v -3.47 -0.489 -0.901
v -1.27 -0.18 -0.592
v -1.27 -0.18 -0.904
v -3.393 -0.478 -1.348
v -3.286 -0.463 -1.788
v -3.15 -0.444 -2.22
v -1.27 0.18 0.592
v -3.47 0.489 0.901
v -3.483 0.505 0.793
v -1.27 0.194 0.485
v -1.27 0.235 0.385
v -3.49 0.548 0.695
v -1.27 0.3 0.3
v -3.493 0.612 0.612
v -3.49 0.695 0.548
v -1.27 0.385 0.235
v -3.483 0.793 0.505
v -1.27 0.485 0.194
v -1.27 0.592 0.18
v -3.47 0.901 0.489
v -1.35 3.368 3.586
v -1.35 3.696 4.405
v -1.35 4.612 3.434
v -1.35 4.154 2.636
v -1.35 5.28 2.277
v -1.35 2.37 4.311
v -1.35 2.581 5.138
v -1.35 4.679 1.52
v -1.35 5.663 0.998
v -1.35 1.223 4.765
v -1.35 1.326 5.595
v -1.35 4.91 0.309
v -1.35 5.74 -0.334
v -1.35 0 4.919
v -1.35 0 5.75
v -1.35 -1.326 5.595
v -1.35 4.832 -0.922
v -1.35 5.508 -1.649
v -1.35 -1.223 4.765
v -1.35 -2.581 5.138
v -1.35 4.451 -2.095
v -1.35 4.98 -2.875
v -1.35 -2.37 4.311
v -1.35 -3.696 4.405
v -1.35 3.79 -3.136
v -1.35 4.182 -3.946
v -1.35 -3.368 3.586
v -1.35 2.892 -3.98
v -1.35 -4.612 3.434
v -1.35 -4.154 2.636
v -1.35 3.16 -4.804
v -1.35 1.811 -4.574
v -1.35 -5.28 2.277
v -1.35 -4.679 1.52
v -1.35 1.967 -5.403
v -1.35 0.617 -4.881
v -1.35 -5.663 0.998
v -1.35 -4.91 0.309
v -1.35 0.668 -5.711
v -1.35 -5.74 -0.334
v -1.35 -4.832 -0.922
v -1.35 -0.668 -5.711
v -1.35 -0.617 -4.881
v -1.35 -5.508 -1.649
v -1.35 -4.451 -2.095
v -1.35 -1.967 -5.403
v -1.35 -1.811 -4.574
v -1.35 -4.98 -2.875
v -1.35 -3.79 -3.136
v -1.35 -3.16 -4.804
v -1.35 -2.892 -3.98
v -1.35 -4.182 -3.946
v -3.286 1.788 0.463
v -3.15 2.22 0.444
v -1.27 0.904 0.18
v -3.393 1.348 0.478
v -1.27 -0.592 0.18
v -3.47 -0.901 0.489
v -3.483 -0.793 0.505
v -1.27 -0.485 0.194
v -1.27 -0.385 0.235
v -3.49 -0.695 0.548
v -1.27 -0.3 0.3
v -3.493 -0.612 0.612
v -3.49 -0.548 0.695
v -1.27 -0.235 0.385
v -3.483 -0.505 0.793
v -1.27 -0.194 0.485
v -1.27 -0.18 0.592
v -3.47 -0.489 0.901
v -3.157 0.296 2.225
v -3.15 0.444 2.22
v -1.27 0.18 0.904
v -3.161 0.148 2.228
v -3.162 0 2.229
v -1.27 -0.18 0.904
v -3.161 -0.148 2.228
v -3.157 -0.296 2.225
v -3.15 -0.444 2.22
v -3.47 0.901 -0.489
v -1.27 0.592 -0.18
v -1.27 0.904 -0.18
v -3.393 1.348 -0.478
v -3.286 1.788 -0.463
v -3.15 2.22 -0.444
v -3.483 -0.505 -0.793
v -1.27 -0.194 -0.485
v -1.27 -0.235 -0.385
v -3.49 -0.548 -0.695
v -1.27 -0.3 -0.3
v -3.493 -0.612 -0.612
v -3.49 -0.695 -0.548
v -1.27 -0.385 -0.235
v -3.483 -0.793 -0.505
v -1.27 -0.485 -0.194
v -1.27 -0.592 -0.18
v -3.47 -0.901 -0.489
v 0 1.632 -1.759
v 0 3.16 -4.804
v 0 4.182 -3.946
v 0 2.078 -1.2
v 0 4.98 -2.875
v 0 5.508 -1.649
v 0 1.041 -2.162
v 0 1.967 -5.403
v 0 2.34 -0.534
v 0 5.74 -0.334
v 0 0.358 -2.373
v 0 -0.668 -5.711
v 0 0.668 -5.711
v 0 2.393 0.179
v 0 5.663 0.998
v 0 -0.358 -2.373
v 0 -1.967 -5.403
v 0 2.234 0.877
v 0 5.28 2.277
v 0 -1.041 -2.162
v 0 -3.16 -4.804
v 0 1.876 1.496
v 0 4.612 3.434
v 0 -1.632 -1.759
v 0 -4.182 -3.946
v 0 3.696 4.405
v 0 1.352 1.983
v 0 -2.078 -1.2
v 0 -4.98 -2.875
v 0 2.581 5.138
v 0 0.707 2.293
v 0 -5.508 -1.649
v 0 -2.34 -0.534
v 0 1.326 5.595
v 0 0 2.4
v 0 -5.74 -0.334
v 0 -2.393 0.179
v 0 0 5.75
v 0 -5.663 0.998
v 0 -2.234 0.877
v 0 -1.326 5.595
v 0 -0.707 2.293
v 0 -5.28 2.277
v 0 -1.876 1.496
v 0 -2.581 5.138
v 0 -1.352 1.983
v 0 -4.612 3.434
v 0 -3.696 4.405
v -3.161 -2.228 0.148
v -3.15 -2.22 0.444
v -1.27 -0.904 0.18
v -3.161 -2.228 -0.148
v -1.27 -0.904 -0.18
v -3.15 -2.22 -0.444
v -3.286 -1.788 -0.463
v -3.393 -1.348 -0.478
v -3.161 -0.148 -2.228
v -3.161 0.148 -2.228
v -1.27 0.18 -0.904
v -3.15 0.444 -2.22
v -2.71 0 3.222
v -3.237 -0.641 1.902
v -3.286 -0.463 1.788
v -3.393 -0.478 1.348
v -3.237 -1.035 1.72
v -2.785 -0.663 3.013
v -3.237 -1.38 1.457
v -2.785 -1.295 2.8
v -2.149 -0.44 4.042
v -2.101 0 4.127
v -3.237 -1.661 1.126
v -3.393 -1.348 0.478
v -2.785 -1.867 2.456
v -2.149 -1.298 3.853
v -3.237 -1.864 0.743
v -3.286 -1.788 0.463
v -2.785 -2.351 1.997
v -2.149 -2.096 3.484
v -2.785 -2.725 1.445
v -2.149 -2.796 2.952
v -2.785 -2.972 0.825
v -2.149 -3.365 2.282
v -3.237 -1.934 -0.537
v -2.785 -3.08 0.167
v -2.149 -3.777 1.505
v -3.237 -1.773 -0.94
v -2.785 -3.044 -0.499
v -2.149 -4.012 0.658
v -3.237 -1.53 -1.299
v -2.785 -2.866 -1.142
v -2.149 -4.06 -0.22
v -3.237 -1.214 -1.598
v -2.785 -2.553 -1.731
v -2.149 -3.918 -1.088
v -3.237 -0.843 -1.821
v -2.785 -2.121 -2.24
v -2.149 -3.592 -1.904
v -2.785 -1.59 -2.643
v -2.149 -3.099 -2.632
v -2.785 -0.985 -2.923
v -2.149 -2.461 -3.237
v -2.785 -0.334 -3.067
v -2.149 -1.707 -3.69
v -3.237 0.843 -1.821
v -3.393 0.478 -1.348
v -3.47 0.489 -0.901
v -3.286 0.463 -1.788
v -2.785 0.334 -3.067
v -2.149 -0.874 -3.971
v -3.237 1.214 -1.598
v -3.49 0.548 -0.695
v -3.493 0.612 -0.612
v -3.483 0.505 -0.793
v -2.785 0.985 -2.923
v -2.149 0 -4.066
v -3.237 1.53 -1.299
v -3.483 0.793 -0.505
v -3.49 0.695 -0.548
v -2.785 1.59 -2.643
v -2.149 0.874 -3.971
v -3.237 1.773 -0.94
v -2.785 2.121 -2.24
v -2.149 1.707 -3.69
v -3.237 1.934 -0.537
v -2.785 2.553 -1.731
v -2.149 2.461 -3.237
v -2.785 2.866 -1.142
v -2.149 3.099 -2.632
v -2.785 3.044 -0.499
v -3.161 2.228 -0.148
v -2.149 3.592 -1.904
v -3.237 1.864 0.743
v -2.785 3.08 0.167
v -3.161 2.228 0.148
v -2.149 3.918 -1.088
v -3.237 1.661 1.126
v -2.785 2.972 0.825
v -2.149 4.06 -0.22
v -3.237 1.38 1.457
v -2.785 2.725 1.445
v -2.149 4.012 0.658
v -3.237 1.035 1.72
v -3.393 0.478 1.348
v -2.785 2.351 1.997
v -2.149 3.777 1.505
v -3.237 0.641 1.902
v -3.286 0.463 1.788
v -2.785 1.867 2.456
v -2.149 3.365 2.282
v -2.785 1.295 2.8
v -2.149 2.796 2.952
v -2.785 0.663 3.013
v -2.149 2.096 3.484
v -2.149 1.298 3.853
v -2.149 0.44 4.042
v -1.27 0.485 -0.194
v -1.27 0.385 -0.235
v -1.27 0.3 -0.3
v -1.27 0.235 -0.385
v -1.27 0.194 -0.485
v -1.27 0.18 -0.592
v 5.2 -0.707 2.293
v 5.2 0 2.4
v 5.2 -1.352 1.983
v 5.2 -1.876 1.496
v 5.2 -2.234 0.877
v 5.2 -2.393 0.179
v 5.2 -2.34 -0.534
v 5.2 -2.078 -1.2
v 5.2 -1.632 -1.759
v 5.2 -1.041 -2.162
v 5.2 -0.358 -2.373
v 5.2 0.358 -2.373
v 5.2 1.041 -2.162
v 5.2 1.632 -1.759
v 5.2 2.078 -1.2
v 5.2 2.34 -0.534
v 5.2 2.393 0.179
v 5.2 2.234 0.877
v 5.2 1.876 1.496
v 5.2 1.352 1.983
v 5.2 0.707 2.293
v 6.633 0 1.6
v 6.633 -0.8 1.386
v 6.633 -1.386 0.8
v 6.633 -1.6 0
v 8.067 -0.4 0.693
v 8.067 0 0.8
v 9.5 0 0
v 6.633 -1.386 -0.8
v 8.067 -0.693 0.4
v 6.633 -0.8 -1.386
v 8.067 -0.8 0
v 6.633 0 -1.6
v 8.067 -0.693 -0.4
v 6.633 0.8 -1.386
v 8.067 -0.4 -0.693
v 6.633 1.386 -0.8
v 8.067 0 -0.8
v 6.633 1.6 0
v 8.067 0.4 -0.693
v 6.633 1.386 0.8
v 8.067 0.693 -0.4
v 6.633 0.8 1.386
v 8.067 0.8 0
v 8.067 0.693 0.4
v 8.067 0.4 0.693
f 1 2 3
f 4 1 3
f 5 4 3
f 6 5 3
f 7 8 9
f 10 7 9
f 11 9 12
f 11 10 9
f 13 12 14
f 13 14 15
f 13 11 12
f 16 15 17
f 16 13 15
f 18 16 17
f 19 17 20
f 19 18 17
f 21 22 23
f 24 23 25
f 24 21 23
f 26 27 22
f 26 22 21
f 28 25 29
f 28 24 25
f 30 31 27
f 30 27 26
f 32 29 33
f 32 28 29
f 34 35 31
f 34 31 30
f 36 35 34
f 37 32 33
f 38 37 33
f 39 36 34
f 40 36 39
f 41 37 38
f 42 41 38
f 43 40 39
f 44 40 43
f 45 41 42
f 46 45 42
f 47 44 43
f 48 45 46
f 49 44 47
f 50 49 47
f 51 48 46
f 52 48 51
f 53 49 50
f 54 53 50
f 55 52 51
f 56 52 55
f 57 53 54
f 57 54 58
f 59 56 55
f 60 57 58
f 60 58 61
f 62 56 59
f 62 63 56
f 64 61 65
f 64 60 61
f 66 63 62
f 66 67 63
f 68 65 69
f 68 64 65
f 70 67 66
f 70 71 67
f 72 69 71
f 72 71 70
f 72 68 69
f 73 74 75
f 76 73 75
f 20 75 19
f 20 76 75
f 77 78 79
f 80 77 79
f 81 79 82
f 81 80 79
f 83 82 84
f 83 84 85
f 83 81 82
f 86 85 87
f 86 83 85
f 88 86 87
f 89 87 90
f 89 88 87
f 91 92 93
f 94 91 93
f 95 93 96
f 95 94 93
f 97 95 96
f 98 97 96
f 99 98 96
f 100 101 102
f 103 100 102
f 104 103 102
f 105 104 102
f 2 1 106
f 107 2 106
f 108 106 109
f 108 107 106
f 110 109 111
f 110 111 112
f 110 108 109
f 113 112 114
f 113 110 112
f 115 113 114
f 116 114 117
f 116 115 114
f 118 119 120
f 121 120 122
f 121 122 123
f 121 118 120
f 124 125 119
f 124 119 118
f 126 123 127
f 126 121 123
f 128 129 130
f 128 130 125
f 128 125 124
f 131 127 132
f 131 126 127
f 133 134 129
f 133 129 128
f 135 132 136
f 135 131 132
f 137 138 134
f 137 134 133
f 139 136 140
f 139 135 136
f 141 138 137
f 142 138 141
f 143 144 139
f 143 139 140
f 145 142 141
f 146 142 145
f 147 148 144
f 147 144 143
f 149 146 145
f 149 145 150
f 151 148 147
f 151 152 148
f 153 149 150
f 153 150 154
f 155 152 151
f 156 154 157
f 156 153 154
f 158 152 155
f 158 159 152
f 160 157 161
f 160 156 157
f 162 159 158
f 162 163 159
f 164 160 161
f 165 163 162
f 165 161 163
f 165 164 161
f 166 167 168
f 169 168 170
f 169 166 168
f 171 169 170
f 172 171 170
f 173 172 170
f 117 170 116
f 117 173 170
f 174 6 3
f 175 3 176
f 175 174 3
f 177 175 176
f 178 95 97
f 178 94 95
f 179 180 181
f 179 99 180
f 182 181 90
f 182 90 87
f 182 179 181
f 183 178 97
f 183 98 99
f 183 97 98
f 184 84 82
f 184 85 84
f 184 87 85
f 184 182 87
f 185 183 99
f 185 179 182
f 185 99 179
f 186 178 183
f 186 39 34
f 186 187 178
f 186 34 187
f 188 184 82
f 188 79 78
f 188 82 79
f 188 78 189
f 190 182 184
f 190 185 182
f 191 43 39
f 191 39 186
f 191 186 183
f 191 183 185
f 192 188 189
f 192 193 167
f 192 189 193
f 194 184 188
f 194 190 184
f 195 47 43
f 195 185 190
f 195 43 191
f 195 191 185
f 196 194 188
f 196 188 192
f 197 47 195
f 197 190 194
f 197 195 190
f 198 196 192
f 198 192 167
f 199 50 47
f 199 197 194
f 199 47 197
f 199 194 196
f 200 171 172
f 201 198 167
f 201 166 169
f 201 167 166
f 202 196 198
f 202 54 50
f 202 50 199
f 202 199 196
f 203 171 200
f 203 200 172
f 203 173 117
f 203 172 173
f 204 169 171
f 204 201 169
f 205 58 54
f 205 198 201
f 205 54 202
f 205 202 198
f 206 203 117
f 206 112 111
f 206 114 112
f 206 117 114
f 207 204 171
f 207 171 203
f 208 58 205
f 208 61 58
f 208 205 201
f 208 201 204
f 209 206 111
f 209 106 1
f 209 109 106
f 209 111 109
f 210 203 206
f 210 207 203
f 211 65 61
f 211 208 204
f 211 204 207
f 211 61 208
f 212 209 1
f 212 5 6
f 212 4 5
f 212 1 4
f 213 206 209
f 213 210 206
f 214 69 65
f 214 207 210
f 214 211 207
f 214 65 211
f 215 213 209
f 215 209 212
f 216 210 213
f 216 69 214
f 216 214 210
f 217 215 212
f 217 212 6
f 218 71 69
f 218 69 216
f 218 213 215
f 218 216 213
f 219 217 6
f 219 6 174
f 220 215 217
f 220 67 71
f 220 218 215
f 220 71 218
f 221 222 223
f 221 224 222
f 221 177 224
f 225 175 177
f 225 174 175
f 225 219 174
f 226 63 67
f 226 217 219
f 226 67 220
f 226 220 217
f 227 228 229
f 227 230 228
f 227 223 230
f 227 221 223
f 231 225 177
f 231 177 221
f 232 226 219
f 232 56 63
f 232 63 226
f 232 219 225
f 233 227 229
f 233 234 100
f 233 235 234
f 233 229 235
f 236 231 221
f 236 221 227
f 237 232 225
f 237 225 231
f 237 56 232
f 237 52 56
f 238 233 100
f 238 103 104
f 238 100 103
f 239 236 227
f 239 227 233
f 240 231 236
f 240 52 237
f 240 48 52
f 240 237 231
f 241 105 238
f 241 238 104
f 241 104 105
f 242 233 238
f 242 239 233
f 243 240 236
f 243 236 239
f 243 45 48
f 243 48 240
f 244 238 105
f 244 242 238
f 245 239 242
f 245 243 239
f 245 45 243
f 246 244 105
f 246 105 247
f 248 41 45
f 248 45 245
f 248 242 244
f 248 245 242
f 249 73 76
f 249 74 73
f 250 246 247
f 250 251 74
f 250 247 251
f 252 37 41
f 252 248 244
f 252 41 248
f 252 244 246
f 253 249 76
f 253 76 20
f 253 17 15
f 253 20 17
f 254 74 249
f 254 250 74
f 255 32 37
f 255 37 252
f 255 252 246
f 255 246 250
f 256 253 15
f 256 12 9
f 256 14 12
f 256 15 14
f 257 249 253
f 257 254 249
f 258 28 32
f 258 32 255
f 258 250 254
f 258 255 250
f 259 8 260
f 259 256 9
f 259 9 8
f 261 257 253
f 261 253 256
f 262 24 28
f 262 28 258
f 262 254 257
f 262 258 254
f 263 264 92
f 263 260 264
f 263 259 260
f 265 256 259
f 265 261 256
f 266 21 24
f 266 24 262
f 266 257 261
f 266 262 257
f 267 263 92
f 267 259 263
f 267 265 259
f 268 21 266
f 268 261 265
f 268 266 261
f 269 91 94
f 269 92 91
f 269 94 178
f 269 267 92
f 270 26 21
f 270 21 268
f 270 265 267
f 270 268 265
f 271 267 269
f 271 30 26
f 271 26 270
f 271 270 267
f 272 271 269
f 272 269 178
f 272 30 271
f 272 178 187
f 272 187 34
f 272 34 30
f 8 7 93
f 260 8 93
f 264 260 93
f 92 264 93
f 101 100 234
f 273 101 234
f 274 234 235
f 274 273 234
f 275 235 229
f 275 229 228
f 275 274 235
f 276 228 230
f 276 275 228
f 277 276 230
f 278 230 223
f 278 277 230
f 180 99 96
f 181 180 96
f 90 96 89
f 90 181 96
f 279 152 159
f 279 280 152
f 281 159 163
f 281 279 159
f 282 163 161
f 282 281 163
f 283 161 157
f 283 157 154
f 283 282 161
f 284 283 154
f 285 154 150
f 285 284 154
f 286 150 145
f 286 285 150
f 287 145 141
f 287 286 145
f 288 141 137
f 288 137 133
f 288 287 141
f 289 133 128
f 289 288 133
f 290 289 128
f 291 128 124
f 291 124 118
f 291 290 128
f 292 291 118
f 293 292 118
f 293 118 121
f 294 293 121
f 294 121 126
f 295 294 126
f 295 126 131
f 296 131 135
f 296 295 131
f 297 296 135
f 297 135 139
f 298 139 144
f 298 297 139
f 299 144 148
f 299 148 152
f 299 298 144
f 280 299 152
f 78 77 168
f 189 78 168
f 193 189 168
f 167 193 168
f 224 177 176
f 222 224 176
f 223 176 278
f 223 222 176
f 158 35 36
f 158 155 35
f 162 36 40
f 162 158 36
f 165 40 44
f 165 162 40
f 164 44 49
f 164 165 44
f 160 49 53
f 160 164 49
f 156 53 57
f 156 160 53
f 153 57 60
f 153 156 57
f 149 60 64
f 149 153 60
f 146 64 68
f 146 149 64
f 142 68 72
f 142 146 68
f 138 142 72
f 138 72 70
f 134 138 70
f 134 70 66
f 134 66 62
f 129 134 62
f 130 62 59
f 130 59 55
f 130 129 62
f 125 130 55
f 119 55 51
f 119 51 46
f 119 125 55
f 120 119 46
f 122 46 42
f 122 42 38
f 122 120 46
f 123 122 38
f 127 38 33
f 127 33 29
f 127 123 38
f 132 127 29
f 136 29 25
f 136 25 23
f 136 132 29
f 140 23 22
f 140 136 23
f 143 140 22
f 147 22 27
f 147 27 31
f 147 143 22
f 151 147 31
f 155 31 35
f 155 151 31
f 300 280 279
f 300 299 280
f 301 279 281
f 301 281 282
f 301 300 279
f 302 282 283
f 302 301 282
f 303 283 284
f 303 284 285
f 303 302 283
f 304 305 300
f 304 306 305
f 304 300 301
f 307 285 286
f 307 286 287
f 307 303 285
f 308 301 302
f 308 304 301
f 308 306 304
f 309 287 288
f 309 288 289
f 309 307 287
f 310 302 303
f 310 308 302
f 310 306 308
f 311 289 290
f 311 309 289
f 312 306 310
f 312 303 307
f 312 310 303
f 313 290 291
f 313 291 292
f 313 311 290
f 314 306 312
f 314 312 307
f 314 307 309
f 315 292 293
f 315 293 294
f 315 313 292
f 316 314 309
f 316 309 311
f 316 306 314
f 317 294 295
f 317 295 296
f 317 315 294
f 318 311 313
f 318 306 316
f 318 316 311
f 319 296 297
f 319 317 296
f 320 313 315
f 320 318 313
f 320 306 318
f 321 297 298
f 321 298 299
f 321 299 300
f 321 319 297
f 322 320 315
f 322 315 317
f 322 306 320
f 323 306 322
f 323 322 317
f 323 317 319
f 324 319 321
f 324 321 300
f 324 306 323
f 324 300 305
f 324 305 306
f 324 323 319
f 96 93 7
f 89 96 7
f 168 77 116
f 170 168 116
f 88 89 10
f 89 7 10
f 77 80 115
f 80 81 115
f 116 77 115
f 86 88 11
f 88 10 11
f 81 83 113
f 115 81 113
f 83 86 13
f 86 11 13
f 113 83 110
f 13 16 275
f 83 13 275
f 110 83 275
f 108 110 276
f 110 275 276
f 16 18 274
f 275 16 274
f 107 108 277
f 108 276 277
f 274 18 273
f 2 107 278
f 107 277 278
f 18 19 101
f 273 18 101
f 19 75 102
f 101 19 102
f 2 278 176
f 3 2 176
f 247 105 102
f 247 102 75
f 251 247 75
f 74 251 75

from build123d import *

# Parameters (mm, degrees)
CHAMFER1_SIZE      = 0.48
CHAMFER1_SIZE2     = 0.831384388
CUT_EXTRUDE1_DEPTH = 2.28
DRAFT1_ANGLE       = -35
DRAFT2_ANGLE       = -8
FILLET1_R          = 0.416666667


with BuildPart() as part:
    # Sketch1 → Revolve1 (revolve)
    with BuildSketch(Plane.XY, mode=Mode.PRIVATE) as revolve1_sk:
        with BuildLine():
            Line((0, 5.75), (0, 2.4))
            Line((0, 2.4), (9.5, 2.4))
            Line((9.5, 2.4), (9.5, 0))
            Line((9.5, 0), (-3.55, 0))
            ThreePointArc((-3.55, 0), (-2.974948133, 2.694438717), (-1.35, 4.91934955))
            Line((-1.35, 4.91934955), (-1.35, 5.75))
            Line((-1.35, 5.75), (0, 5.75))
        make_face()
    revolve(revolve1_sk.sketch.rotate(Axis((-6.478309986, 0, 0), (1, 0, 0)), 90), axis=Axis((-6.478309986, 0, 0), (1, 0, 0)))

    # Chamfer1
    chamfer1_edges = [part.edges().sort_by_distance(p)[0] for p in [
        (9.5, 0, -2.4),
    ]]
    chamfer1_side = [part.faces().sort_by_distance(p)[0] for p in [
        (9.5, 0, 0),
    ]]
    chamfer(chamfer1_edges, length=CHAMFER1_SIZE, length2=CHAMFER1_SIZE2, reference=chamfer1_side[0])

    # Sketch8 → EndCone (revolve, cut)
    with BuildSketch(Plane.XY, mode=Mode.PRIVATE) as endcone_sk:
        Polygon((9.5, 0), (9.7, 0), (9.7, -2.6), (5.2, -2.6), (5.2, -2.4), align=None)
    revolve(endcone_sk.sketch.rotate(Axis((0, 0, 0), (1, 0, 0)), 270), axis=Axis((0, 0, 0), (1, 0, 0)), mode=Mode.SUBTRACT)

    # Sketch4 → Cut-Extrude1 (cut)
    with BuildSketch(Plane(origin=(-3.55, 0, 0), x_dir=(0, 0, -1), z_dir=(1, 0, 0))):
        Polygon((0.5, 2.5), (-0.5, 2.5), (-0.5, 0.5), (-2.5, 0.5), (-2.5, -0.5), (-0.5, -0.5), (-0.5, -2.5), (0.5, -2.5), (0.5, -0.5), (2.5, -0.5), (2.5, 0.5), (0.5, 0.5), align=None)
    extrude(amount=CUT_EXTRUDE1_DEPTH, mode=Mode.SUBTRACT)

    # Draft1
    draft1_faces = [part.faces().sort_by_distance(p)[0] for p in [
        (-2.160691933, 0, -2.5),
        (-2.160691933, -2.5, 0),
        (-2.160691933, 0, 2.5),
        (-2.160691933, 2.5, 0),
    ]]
    draft(draft1_faces, Plane.YZ.offset(-3.55), DRAFT1_ANGLE)

    # Draft2
    draft2_faces = [part.faces().sort_by_distance(p)[0] for p in [
        (-2.544118115, 1.102349446, -0.5),
        (-2.544118115, 0.5, -1.102349446),
        (-2.544118115, -0.5, -1.102349446),
        (-2.544118115, -1.102349446, -0.5),
        (-2.544118115, -1.102349446, 0.5),
        (-2.544118115, -0.5, 1.102349446),
        (-2.544118115, 0.5, 1.102349446),
        (-2.544118115, 1.102349446, 0.5),
    ]]
    draft(draft2_faces, Plane.YZ.offset(-3.55), DRAFT2_ANGLE)

    # Fillet1
    fillet1_edges = [part.edges().sort_by_distance(p)[0] for p in [
        (-2.391402154, 0.337169692, -0.337169692),
        (-2.391402154, 0.337169692, 0.337169692),
        (-2.391402154, -0.337169692, 0.337169692),
        (-2.391402154, -0.337169692, -0.337169692),
    ]]
    fillet(fillet1_edges, radius=FILLET1_R)


solid = part.part
